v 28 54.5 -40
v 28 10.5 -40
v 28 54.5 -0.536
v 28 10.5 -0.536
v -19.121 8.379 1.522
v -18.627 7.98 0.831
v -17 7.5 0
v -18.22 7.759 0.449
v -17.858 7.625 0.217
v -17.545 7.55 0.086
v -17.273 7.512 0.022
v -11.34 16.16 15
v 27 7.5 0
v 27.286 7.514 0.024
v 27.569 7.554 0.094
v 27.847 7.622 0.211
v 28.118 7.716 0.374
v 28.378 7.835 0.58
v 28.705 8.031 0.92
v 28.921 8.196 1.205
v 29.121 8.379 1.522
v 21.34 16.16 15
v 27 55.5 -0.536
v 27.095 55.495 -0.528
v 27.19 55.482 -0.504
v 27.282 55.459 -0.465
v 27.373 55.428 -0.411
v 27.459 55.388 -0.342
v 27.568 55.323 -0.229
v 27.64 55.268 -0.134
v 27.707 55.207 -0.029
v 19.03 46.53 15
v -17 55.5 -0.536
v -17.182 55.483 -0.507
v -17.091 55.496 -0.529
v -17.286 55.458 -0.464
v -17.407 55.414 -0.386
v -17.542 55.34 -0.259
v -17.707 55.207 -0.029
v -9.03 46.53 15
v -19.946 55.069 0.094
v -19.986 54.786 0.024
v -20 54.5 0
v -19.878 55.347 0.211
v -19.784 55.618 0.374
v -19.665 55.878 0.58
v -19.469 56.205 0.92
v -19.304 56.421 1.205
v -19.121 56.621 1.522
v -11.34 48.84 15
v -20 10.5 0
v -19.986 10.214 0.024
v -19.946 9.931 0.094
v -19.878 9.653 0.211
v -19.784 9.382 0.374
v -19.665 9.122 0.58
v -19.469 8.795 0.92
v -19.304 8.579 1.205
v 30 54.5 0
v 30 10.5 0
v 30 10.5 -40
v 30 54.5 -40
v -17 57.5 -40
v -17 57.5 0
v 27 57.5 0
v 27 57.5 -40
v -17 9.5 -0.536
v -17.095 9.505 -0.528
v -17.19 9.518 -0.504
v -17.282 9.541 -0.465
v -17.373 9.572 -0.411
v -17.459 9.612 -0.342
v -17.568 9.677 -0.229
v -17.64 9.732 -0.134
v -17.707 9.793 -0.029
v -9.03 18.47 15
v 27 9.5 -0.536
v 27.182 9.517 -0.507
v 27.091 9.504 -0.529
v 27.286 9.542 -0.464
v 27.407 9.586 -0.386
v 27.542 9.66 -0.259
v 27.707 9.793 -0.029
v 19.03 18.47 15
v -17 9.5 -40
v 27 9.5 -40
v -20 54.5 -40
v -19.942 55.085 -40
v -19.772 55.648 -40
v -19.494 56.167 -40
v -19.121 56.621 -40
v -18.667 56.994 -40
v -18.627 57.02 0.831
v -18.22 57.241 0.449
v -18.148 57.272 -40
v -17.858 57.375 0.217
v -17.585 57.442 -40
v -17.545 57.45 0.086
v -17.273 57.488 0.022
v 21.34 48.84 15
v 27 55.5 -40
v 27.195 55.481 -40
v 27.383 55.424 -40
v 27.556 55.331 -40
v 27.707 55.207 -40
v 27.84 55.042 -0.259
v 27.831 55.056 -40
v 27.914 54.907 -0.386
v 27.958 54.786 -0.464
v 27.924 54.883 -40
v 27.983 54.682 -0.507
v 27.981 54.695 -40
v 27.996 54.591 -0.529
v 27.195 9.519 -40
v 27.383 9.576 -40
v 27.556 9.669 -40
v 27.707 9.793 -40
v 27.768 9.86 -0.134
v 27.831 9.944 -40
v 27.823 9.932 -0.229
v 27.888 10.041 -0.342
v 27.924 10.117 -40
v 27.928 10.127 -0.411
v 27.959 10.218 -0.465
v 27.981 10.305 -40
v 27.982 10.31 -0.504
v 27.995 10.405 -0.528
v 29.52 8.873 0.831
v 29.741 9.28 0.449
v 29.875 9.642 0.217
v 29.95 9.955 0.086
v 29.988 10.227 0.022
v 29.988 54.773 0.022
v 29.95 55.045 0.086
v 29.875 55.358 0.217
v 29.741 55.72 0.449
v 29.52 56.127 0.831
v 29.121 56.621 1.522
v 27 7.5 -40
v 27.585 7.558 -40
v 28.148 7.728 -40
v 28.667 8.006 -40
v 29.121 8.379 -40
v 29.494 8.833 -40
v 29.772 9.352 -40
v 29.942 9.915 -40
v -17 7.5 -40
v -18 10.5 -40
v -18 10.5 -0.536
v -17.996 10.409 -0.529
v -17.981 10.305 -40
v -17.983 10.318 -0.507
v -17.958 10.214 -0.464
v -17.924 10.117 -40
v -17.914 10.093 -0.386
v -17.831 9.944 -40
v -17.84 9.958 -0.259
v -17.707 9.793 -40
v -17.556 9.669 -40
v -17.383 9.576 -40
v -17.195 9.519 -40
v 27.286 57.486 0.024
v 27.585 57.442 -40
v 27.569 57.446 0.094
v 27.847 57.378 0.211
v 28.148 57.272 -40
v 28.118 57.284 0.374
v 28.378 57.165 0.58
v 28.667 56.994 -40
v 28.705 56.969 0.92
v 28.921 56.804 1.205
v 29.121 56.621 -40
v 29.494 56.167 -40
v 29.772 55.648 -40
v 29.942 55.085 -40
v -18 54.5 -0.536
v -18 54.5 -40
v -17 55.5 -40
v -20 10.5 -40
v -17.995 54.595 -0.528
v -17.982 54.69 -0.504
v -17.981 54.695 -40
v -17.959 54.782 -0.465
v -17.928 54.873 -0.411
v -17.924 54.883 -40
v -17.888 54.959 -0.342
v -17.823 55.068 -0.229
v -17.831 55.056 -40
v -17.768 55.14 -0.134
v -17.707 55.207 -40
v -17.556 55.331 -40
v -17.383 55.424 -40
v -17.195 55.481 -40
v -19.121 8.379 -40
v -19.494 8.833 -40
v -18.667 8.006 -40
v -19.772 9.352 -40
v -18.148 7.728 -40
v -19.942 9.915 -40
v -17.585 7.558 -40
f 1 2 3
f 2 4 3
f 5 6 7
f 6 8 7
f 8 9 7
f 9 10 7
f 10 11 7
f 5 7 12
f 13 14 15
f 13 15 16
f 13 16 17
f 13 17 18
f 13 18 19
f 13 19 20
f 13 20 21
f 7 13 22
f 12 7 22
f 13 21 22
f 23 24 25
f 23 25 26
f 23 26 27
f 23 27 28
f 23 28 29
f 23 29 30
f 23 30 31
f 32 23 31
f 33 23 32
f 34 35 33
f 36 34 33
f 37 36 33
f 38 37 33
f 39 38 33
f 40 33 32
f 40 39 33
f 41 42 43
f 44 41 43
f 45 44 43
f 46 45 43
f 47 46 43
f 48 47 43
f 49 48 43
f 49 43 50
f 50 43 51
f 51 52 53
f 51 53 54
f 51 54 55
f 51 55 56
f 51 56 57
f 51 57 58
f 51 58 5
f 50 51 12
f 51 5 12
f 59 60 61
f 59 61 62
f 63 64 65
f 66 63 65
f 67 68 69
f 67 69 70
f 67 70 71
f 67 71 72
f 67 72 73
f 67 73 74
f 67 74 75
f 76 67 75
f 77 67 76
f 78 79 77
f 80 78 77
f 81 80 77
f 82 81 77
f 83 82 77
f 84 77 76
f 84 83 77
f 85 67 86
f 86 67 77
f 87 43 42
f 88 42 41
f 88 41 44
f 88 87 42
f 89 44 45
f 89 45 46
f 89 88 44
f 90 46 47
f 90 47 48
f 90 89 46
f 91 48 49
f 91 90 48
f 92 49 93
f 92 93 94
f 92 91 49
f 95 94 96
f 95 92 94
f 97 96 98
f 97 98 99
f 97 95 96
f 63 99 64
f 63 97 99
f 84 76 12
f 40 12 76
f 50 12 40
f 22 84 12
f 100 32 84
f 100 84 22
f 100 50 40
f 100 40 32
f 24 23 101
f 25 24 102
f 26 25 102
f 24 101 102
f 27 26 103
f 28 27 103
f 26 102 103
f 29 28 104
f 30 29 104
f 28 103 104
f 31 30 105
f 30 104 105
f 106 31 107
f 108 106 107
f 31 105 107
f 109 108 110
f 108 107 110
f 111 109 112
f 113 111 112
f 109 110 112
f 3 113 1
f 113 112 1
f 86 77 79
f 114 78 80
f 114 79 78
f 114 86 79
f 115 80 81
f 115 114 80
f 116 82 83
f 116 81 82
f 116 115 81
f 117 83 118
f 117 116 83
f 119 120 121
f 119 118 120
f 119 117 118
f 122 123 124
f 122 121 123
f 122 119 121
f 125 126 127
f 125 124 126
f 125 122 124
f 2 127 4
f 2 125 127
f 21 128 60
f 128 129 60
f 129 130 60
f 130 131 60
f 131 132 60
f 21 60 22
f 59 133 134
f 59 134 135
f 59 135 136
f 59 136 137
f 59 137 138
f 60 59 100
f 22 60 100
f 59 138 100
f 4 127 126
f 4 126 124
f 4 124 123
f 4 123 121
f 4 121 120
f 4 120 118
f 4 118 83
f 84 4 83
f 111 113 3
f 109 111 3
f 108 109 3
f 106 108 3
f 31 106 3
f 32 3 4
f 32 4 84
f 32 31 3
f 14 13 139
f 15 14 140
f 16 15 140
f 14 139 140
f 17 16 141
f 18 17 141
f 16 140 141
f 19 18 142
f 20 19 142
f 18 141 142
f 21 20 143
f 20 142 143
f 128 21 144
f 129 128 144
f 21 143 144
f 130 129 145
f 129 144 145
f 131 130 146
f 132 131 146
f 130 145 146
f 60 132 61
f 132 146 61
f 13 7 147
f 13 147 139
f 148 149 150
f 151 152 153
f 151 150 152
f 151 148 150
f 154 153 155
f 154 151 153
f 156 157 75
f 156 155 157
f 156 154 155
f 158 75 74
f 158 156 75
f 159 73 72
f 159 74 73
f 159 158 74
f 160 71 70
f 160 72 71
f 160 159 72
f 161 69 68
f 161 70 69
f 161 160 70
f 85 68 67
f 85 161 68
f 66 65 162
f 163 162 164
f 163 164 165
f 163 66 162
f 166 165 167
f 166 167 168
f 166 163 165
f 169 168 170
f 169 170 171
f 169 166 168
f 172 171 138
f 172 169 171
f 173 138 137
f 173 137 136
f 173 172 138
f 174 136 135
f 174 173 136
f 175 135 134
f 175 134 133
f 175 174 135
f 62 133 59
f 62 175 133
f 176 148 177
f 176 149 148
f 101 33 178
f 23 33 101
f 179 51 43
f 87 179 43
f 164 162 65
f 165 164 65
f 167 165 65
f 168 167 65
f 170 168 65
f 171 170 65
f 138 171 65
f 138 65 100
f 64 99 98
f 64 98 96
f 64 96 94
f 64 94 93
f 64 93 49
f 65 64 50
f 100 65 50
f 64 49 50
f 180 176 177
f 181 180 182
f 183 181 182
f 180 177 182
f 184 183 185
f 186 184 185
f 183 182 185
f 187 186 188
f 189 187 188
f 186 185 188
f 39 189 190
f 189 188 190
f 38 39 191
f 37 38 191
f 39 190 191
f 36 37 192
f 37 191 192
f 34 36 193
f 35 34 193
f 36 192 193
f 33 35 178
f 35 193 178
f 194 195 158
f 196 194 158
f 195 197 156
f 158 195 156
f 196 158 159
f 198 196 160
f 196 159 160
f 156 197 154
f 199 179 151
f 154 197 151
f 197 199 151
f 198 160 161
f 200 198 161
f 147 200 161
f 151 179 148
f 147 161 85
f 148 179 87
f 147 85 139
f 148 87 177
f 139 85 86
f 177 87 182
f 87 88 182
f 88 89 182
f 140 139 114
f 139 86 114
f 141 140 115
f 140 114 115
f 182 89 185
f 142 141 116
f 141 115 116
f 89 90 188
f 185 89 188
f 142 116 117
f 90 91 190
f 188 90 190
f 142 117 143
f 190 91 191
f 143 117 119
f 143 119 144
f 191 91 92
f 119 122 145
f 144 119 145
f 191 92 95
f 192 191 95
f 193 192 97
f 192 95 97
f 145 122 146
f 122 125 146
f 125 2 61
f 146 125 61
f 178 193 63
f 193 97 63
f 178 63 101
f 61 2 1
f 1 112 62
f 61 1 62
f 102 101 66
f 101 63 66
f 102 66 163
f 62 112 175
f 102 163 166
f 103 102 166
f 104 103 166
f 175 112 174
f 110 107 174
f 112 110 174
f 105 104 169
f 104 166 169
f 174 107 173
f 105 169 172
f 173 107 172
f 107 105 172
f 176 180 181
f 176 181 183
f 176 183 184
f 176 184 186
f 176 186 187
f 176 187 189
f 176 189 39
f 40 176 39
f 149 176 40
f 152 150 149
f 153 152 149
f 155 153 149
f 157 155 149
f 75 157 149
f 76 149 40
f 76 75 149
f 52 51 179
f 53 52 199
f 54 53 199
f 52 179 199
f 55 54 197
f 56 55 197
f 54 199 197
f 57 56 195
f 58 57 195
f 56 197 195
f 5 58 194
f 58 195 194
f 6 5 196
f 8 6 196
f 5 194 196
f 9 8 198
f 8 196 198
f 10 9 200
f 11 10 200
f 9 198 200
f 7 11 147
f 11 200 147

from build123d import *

# Parameters (mm, degrees)
SKETCH1_W           = 50
SKETCH1_H           = 50
BOSS_EXTRUDE1_DEPTH = 40
SKETCH2_W           = 50
SKETCH2_H           = 50
BOSS_EXTRUDE2_DEPTH = 15
BOSS_EXTRUDE2_TAPER = 30
FILLET1_R           = 3
SHELL1_T            = -2


with BuildPart() as part:
    # Sketch1 → Boss-Extrude1 (new body)
    with BuildSketch(Plane.XY):
        with Locations((5, 32.5)):
            Rectangle(SKETCH1_W, SKETCH1_H)
    extrude(amount=-BOSS_EXTRUDE1_DEPTH)

    # Sketch2 → Boss-Extrude2 (add)
    with BuildSketch(Plane.XY):
        with Locations((5, 32.5)):
            Rectangle(SKETCH2_W, SKETCH2_H)
    extrude(amount=BOSS_EXTRUDE2_DEPTH, taper=BOSS_EXTRUDE2_TAPER)

    # Fillet1
    fillet1_edges = [part.edges().sort_by_distance(p)[0] for p in [
        (30, 7.5, -20),
        (-20, 7.5, -20),
        (-20, 57.5, -20),
        (30, 57.5, -20),
    ]]
    fillet(fillet1_edges, radius=FILLET1_R)

    # Shell1
    shell1_openings = [part.faces().sort_by_distance(p)[0] for p in [
        (5, 32.5, -40),
        (5, 32.5, 15),
    ]]
    offset(amount=SHELL1_T, openings=shell1_openings, kind=Kind.INTERSECTION)


solid = part.part
